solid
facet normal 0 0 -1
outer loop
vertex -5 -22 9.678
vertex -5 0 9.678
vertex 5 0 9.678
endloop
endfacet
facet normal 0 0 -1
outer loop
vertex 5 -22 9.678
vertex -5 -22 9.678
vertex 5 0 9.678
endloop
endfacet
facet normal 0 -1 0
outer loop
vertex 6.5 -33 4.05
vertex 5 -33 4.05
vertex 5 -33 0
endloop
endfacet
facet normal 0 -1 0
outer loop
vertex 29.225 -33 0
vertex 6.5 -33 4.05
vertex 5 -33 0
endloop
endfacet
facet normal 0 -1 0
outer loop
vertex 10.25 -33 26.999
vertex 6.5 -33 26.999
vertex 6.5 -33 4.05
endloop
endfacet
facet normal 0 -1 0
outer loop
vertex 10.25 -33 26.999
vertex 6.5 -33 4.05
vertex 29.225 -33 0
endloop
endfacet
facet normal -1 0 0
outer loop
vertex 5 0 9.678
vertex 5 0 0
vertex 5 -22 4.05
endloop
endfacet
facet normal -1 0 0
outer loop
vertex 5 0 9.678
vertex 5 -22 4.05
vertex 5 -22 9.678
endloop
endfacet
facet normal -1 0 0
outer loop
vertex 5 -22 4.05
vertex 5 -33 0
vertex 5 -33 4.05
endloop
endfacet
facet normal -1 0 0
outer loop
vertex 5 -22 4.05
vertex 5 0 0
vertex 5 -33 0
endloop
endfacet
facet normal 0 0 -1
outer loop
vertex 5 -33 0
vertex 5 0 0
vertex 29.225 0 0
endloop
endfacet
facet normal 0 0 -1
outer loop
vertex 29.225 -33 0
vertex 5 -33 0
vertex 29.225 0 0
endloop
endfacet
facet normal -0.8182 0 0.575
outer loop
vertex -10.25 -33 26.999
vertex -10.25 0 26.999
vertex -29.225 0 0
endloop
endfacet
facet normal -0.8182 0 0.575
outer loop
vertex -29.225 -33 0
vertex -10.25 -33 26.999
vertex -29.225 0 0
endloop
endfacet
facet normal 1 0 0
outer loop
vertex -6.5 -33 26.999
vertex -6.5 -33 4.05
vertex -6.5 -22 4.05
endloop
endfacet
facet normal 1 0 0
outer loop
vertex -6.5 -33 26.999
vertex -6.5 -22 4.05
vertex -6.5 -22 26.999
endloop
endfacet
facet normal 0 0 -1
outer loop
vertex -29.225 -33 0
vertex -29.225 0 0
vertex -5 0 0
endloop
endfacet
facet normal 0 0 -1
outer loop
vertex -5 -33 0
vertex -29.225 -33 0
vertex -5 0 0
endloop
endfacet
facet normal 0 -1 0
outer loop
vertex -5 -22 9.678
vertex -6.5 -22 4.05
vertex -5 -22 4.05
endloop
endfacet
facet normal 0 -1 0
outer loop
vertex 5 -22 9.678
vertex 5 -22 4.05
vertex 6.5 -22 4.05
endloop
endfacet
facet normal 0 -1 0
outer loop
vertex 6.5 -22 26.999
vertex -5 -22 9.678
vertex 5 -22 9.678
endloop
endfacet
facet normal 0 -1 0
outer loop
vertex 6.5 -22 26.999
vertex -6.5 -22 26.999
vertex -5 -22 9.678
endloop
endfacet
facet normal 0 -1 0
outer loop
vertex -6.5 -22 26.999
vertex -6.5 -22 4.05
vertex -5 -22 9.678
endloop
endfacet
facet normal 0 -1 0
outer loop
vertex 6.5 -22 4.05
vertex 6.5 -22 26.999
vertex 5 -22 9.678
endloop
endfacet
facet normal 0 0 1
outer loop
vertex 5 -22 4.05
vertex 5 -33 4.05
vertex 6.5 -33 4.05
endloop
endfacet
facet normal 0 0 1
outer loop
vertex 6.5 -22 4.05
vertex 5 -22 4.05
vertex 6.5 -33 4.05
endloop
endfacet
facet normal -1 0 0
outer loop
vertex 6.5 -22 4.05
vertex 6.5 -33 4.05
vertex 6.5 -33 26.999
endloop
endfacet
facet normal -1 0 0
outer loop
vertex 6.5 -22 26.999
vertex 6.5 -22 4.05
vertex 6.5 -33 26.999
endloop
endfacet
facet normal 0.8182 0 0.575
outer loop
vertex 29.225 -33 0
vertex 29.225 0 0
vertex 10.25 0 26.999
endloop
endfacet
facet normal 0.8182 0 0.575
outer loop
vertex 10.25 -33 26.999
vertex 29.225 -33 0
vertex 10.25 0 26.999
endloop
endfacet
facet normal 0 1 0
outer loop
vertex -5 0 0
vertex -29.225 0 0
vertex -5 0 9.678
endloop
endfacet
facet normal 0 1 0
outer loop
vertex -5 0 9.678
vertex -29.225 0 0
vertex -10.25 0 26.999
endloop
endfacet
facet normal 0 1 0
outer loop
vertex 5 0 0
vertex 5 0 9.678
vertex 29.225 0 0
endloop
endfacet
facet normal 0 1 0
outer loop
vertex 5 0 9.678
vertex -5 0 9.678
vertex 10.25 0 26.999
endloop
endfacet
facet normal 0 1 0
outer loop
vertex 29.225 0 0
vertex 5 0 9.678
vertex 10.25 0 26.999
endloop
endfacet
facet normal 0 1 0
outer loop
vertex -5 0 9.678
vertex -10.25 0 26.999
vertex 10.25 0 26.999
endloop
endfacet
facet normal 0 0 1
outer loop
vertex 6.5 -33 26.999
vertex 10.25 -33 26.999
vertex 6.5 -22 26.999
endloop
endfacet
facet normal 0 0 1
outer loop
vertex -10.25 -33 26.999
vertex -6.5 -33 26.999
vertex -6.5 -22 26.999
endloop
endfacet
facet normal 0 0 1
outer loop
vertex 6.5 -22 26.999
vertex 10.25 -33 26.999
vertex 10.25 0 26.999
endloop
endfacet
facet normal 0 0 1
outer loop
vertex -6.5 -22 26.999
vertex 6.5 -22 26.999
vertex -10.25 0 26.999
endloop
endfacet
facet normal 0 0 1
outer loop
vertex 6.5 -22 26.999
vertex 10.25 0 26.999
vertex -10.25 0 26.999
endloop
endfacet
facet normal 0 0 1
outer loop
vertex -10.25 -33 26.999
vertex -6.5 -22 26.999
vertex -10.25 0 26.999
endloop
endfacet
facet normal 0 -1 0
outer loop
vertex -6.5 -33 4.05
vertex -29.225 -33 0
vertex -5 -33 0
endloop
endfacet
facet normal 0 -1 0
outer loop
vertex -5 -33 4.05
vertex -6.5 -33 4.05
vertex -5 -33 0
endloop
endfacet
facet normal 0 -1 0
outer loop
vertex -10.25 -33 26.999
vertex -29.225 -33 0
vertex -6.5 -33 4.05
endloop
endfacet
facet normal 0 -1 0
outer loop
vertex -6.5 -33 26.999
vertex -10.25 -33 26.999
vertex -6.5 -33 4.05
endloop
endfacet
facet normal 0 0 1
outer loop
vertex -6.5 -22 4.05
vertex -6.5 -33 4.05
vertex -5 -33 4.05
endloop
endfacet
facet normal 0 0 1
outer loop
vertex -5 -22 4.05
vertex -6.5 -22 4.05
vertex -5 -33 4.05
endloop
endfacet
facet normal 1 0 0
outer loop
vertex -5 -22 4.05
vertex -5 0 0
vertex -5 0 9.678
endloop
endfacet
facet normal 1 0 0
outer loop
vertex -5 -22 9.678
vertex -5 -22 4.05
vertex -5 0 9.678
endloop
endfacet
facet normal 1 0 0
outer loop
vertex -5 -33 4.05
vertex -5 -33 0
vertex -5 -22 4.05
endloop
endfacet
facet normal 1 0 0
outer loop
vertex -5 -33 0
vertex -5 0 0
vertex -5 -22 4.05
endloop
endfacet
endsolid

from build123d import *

# Parameters (mm, degrees)
F1_DEPTH = 33
F2_W     = 10
F2_H     = 9.678203
F3_DEPTH = 33
F4_W     = 13
F4_H     = 22.949062
F5_DEPTH = 11


with BuildPart() as f1:
    # F0 (on Front) → F1 (new body)
    with BuildSketch(Plane.XZ):
        Polygon((10.25, 26.999062), (-10.25, 26.999062), (-29.225, 0), (29.225, 0), align=None)
    extrude(amount=F1_DEPTH)

    # F2 (on face) → F3 (cut)
    with BuildSketch(Plane.XZ.offset(33)):
        with Locations((0, 4.839101)):
            Rectangle(F2_W, F2_H)
    extrude(amount=-F3_DEPTH, mode=Mode.SUBTRACT)

    # F4 (on face) → F5 (cut)
    with BuildSketch(Plane.XZ.offset(33)):
        with Locations((0, 15.524531)):
            Rectangle(F4_W, F4_H)
    extrude(amount=-F5_DEPTH, mode=Mode.SUBTRACT)


solid = f1.part
